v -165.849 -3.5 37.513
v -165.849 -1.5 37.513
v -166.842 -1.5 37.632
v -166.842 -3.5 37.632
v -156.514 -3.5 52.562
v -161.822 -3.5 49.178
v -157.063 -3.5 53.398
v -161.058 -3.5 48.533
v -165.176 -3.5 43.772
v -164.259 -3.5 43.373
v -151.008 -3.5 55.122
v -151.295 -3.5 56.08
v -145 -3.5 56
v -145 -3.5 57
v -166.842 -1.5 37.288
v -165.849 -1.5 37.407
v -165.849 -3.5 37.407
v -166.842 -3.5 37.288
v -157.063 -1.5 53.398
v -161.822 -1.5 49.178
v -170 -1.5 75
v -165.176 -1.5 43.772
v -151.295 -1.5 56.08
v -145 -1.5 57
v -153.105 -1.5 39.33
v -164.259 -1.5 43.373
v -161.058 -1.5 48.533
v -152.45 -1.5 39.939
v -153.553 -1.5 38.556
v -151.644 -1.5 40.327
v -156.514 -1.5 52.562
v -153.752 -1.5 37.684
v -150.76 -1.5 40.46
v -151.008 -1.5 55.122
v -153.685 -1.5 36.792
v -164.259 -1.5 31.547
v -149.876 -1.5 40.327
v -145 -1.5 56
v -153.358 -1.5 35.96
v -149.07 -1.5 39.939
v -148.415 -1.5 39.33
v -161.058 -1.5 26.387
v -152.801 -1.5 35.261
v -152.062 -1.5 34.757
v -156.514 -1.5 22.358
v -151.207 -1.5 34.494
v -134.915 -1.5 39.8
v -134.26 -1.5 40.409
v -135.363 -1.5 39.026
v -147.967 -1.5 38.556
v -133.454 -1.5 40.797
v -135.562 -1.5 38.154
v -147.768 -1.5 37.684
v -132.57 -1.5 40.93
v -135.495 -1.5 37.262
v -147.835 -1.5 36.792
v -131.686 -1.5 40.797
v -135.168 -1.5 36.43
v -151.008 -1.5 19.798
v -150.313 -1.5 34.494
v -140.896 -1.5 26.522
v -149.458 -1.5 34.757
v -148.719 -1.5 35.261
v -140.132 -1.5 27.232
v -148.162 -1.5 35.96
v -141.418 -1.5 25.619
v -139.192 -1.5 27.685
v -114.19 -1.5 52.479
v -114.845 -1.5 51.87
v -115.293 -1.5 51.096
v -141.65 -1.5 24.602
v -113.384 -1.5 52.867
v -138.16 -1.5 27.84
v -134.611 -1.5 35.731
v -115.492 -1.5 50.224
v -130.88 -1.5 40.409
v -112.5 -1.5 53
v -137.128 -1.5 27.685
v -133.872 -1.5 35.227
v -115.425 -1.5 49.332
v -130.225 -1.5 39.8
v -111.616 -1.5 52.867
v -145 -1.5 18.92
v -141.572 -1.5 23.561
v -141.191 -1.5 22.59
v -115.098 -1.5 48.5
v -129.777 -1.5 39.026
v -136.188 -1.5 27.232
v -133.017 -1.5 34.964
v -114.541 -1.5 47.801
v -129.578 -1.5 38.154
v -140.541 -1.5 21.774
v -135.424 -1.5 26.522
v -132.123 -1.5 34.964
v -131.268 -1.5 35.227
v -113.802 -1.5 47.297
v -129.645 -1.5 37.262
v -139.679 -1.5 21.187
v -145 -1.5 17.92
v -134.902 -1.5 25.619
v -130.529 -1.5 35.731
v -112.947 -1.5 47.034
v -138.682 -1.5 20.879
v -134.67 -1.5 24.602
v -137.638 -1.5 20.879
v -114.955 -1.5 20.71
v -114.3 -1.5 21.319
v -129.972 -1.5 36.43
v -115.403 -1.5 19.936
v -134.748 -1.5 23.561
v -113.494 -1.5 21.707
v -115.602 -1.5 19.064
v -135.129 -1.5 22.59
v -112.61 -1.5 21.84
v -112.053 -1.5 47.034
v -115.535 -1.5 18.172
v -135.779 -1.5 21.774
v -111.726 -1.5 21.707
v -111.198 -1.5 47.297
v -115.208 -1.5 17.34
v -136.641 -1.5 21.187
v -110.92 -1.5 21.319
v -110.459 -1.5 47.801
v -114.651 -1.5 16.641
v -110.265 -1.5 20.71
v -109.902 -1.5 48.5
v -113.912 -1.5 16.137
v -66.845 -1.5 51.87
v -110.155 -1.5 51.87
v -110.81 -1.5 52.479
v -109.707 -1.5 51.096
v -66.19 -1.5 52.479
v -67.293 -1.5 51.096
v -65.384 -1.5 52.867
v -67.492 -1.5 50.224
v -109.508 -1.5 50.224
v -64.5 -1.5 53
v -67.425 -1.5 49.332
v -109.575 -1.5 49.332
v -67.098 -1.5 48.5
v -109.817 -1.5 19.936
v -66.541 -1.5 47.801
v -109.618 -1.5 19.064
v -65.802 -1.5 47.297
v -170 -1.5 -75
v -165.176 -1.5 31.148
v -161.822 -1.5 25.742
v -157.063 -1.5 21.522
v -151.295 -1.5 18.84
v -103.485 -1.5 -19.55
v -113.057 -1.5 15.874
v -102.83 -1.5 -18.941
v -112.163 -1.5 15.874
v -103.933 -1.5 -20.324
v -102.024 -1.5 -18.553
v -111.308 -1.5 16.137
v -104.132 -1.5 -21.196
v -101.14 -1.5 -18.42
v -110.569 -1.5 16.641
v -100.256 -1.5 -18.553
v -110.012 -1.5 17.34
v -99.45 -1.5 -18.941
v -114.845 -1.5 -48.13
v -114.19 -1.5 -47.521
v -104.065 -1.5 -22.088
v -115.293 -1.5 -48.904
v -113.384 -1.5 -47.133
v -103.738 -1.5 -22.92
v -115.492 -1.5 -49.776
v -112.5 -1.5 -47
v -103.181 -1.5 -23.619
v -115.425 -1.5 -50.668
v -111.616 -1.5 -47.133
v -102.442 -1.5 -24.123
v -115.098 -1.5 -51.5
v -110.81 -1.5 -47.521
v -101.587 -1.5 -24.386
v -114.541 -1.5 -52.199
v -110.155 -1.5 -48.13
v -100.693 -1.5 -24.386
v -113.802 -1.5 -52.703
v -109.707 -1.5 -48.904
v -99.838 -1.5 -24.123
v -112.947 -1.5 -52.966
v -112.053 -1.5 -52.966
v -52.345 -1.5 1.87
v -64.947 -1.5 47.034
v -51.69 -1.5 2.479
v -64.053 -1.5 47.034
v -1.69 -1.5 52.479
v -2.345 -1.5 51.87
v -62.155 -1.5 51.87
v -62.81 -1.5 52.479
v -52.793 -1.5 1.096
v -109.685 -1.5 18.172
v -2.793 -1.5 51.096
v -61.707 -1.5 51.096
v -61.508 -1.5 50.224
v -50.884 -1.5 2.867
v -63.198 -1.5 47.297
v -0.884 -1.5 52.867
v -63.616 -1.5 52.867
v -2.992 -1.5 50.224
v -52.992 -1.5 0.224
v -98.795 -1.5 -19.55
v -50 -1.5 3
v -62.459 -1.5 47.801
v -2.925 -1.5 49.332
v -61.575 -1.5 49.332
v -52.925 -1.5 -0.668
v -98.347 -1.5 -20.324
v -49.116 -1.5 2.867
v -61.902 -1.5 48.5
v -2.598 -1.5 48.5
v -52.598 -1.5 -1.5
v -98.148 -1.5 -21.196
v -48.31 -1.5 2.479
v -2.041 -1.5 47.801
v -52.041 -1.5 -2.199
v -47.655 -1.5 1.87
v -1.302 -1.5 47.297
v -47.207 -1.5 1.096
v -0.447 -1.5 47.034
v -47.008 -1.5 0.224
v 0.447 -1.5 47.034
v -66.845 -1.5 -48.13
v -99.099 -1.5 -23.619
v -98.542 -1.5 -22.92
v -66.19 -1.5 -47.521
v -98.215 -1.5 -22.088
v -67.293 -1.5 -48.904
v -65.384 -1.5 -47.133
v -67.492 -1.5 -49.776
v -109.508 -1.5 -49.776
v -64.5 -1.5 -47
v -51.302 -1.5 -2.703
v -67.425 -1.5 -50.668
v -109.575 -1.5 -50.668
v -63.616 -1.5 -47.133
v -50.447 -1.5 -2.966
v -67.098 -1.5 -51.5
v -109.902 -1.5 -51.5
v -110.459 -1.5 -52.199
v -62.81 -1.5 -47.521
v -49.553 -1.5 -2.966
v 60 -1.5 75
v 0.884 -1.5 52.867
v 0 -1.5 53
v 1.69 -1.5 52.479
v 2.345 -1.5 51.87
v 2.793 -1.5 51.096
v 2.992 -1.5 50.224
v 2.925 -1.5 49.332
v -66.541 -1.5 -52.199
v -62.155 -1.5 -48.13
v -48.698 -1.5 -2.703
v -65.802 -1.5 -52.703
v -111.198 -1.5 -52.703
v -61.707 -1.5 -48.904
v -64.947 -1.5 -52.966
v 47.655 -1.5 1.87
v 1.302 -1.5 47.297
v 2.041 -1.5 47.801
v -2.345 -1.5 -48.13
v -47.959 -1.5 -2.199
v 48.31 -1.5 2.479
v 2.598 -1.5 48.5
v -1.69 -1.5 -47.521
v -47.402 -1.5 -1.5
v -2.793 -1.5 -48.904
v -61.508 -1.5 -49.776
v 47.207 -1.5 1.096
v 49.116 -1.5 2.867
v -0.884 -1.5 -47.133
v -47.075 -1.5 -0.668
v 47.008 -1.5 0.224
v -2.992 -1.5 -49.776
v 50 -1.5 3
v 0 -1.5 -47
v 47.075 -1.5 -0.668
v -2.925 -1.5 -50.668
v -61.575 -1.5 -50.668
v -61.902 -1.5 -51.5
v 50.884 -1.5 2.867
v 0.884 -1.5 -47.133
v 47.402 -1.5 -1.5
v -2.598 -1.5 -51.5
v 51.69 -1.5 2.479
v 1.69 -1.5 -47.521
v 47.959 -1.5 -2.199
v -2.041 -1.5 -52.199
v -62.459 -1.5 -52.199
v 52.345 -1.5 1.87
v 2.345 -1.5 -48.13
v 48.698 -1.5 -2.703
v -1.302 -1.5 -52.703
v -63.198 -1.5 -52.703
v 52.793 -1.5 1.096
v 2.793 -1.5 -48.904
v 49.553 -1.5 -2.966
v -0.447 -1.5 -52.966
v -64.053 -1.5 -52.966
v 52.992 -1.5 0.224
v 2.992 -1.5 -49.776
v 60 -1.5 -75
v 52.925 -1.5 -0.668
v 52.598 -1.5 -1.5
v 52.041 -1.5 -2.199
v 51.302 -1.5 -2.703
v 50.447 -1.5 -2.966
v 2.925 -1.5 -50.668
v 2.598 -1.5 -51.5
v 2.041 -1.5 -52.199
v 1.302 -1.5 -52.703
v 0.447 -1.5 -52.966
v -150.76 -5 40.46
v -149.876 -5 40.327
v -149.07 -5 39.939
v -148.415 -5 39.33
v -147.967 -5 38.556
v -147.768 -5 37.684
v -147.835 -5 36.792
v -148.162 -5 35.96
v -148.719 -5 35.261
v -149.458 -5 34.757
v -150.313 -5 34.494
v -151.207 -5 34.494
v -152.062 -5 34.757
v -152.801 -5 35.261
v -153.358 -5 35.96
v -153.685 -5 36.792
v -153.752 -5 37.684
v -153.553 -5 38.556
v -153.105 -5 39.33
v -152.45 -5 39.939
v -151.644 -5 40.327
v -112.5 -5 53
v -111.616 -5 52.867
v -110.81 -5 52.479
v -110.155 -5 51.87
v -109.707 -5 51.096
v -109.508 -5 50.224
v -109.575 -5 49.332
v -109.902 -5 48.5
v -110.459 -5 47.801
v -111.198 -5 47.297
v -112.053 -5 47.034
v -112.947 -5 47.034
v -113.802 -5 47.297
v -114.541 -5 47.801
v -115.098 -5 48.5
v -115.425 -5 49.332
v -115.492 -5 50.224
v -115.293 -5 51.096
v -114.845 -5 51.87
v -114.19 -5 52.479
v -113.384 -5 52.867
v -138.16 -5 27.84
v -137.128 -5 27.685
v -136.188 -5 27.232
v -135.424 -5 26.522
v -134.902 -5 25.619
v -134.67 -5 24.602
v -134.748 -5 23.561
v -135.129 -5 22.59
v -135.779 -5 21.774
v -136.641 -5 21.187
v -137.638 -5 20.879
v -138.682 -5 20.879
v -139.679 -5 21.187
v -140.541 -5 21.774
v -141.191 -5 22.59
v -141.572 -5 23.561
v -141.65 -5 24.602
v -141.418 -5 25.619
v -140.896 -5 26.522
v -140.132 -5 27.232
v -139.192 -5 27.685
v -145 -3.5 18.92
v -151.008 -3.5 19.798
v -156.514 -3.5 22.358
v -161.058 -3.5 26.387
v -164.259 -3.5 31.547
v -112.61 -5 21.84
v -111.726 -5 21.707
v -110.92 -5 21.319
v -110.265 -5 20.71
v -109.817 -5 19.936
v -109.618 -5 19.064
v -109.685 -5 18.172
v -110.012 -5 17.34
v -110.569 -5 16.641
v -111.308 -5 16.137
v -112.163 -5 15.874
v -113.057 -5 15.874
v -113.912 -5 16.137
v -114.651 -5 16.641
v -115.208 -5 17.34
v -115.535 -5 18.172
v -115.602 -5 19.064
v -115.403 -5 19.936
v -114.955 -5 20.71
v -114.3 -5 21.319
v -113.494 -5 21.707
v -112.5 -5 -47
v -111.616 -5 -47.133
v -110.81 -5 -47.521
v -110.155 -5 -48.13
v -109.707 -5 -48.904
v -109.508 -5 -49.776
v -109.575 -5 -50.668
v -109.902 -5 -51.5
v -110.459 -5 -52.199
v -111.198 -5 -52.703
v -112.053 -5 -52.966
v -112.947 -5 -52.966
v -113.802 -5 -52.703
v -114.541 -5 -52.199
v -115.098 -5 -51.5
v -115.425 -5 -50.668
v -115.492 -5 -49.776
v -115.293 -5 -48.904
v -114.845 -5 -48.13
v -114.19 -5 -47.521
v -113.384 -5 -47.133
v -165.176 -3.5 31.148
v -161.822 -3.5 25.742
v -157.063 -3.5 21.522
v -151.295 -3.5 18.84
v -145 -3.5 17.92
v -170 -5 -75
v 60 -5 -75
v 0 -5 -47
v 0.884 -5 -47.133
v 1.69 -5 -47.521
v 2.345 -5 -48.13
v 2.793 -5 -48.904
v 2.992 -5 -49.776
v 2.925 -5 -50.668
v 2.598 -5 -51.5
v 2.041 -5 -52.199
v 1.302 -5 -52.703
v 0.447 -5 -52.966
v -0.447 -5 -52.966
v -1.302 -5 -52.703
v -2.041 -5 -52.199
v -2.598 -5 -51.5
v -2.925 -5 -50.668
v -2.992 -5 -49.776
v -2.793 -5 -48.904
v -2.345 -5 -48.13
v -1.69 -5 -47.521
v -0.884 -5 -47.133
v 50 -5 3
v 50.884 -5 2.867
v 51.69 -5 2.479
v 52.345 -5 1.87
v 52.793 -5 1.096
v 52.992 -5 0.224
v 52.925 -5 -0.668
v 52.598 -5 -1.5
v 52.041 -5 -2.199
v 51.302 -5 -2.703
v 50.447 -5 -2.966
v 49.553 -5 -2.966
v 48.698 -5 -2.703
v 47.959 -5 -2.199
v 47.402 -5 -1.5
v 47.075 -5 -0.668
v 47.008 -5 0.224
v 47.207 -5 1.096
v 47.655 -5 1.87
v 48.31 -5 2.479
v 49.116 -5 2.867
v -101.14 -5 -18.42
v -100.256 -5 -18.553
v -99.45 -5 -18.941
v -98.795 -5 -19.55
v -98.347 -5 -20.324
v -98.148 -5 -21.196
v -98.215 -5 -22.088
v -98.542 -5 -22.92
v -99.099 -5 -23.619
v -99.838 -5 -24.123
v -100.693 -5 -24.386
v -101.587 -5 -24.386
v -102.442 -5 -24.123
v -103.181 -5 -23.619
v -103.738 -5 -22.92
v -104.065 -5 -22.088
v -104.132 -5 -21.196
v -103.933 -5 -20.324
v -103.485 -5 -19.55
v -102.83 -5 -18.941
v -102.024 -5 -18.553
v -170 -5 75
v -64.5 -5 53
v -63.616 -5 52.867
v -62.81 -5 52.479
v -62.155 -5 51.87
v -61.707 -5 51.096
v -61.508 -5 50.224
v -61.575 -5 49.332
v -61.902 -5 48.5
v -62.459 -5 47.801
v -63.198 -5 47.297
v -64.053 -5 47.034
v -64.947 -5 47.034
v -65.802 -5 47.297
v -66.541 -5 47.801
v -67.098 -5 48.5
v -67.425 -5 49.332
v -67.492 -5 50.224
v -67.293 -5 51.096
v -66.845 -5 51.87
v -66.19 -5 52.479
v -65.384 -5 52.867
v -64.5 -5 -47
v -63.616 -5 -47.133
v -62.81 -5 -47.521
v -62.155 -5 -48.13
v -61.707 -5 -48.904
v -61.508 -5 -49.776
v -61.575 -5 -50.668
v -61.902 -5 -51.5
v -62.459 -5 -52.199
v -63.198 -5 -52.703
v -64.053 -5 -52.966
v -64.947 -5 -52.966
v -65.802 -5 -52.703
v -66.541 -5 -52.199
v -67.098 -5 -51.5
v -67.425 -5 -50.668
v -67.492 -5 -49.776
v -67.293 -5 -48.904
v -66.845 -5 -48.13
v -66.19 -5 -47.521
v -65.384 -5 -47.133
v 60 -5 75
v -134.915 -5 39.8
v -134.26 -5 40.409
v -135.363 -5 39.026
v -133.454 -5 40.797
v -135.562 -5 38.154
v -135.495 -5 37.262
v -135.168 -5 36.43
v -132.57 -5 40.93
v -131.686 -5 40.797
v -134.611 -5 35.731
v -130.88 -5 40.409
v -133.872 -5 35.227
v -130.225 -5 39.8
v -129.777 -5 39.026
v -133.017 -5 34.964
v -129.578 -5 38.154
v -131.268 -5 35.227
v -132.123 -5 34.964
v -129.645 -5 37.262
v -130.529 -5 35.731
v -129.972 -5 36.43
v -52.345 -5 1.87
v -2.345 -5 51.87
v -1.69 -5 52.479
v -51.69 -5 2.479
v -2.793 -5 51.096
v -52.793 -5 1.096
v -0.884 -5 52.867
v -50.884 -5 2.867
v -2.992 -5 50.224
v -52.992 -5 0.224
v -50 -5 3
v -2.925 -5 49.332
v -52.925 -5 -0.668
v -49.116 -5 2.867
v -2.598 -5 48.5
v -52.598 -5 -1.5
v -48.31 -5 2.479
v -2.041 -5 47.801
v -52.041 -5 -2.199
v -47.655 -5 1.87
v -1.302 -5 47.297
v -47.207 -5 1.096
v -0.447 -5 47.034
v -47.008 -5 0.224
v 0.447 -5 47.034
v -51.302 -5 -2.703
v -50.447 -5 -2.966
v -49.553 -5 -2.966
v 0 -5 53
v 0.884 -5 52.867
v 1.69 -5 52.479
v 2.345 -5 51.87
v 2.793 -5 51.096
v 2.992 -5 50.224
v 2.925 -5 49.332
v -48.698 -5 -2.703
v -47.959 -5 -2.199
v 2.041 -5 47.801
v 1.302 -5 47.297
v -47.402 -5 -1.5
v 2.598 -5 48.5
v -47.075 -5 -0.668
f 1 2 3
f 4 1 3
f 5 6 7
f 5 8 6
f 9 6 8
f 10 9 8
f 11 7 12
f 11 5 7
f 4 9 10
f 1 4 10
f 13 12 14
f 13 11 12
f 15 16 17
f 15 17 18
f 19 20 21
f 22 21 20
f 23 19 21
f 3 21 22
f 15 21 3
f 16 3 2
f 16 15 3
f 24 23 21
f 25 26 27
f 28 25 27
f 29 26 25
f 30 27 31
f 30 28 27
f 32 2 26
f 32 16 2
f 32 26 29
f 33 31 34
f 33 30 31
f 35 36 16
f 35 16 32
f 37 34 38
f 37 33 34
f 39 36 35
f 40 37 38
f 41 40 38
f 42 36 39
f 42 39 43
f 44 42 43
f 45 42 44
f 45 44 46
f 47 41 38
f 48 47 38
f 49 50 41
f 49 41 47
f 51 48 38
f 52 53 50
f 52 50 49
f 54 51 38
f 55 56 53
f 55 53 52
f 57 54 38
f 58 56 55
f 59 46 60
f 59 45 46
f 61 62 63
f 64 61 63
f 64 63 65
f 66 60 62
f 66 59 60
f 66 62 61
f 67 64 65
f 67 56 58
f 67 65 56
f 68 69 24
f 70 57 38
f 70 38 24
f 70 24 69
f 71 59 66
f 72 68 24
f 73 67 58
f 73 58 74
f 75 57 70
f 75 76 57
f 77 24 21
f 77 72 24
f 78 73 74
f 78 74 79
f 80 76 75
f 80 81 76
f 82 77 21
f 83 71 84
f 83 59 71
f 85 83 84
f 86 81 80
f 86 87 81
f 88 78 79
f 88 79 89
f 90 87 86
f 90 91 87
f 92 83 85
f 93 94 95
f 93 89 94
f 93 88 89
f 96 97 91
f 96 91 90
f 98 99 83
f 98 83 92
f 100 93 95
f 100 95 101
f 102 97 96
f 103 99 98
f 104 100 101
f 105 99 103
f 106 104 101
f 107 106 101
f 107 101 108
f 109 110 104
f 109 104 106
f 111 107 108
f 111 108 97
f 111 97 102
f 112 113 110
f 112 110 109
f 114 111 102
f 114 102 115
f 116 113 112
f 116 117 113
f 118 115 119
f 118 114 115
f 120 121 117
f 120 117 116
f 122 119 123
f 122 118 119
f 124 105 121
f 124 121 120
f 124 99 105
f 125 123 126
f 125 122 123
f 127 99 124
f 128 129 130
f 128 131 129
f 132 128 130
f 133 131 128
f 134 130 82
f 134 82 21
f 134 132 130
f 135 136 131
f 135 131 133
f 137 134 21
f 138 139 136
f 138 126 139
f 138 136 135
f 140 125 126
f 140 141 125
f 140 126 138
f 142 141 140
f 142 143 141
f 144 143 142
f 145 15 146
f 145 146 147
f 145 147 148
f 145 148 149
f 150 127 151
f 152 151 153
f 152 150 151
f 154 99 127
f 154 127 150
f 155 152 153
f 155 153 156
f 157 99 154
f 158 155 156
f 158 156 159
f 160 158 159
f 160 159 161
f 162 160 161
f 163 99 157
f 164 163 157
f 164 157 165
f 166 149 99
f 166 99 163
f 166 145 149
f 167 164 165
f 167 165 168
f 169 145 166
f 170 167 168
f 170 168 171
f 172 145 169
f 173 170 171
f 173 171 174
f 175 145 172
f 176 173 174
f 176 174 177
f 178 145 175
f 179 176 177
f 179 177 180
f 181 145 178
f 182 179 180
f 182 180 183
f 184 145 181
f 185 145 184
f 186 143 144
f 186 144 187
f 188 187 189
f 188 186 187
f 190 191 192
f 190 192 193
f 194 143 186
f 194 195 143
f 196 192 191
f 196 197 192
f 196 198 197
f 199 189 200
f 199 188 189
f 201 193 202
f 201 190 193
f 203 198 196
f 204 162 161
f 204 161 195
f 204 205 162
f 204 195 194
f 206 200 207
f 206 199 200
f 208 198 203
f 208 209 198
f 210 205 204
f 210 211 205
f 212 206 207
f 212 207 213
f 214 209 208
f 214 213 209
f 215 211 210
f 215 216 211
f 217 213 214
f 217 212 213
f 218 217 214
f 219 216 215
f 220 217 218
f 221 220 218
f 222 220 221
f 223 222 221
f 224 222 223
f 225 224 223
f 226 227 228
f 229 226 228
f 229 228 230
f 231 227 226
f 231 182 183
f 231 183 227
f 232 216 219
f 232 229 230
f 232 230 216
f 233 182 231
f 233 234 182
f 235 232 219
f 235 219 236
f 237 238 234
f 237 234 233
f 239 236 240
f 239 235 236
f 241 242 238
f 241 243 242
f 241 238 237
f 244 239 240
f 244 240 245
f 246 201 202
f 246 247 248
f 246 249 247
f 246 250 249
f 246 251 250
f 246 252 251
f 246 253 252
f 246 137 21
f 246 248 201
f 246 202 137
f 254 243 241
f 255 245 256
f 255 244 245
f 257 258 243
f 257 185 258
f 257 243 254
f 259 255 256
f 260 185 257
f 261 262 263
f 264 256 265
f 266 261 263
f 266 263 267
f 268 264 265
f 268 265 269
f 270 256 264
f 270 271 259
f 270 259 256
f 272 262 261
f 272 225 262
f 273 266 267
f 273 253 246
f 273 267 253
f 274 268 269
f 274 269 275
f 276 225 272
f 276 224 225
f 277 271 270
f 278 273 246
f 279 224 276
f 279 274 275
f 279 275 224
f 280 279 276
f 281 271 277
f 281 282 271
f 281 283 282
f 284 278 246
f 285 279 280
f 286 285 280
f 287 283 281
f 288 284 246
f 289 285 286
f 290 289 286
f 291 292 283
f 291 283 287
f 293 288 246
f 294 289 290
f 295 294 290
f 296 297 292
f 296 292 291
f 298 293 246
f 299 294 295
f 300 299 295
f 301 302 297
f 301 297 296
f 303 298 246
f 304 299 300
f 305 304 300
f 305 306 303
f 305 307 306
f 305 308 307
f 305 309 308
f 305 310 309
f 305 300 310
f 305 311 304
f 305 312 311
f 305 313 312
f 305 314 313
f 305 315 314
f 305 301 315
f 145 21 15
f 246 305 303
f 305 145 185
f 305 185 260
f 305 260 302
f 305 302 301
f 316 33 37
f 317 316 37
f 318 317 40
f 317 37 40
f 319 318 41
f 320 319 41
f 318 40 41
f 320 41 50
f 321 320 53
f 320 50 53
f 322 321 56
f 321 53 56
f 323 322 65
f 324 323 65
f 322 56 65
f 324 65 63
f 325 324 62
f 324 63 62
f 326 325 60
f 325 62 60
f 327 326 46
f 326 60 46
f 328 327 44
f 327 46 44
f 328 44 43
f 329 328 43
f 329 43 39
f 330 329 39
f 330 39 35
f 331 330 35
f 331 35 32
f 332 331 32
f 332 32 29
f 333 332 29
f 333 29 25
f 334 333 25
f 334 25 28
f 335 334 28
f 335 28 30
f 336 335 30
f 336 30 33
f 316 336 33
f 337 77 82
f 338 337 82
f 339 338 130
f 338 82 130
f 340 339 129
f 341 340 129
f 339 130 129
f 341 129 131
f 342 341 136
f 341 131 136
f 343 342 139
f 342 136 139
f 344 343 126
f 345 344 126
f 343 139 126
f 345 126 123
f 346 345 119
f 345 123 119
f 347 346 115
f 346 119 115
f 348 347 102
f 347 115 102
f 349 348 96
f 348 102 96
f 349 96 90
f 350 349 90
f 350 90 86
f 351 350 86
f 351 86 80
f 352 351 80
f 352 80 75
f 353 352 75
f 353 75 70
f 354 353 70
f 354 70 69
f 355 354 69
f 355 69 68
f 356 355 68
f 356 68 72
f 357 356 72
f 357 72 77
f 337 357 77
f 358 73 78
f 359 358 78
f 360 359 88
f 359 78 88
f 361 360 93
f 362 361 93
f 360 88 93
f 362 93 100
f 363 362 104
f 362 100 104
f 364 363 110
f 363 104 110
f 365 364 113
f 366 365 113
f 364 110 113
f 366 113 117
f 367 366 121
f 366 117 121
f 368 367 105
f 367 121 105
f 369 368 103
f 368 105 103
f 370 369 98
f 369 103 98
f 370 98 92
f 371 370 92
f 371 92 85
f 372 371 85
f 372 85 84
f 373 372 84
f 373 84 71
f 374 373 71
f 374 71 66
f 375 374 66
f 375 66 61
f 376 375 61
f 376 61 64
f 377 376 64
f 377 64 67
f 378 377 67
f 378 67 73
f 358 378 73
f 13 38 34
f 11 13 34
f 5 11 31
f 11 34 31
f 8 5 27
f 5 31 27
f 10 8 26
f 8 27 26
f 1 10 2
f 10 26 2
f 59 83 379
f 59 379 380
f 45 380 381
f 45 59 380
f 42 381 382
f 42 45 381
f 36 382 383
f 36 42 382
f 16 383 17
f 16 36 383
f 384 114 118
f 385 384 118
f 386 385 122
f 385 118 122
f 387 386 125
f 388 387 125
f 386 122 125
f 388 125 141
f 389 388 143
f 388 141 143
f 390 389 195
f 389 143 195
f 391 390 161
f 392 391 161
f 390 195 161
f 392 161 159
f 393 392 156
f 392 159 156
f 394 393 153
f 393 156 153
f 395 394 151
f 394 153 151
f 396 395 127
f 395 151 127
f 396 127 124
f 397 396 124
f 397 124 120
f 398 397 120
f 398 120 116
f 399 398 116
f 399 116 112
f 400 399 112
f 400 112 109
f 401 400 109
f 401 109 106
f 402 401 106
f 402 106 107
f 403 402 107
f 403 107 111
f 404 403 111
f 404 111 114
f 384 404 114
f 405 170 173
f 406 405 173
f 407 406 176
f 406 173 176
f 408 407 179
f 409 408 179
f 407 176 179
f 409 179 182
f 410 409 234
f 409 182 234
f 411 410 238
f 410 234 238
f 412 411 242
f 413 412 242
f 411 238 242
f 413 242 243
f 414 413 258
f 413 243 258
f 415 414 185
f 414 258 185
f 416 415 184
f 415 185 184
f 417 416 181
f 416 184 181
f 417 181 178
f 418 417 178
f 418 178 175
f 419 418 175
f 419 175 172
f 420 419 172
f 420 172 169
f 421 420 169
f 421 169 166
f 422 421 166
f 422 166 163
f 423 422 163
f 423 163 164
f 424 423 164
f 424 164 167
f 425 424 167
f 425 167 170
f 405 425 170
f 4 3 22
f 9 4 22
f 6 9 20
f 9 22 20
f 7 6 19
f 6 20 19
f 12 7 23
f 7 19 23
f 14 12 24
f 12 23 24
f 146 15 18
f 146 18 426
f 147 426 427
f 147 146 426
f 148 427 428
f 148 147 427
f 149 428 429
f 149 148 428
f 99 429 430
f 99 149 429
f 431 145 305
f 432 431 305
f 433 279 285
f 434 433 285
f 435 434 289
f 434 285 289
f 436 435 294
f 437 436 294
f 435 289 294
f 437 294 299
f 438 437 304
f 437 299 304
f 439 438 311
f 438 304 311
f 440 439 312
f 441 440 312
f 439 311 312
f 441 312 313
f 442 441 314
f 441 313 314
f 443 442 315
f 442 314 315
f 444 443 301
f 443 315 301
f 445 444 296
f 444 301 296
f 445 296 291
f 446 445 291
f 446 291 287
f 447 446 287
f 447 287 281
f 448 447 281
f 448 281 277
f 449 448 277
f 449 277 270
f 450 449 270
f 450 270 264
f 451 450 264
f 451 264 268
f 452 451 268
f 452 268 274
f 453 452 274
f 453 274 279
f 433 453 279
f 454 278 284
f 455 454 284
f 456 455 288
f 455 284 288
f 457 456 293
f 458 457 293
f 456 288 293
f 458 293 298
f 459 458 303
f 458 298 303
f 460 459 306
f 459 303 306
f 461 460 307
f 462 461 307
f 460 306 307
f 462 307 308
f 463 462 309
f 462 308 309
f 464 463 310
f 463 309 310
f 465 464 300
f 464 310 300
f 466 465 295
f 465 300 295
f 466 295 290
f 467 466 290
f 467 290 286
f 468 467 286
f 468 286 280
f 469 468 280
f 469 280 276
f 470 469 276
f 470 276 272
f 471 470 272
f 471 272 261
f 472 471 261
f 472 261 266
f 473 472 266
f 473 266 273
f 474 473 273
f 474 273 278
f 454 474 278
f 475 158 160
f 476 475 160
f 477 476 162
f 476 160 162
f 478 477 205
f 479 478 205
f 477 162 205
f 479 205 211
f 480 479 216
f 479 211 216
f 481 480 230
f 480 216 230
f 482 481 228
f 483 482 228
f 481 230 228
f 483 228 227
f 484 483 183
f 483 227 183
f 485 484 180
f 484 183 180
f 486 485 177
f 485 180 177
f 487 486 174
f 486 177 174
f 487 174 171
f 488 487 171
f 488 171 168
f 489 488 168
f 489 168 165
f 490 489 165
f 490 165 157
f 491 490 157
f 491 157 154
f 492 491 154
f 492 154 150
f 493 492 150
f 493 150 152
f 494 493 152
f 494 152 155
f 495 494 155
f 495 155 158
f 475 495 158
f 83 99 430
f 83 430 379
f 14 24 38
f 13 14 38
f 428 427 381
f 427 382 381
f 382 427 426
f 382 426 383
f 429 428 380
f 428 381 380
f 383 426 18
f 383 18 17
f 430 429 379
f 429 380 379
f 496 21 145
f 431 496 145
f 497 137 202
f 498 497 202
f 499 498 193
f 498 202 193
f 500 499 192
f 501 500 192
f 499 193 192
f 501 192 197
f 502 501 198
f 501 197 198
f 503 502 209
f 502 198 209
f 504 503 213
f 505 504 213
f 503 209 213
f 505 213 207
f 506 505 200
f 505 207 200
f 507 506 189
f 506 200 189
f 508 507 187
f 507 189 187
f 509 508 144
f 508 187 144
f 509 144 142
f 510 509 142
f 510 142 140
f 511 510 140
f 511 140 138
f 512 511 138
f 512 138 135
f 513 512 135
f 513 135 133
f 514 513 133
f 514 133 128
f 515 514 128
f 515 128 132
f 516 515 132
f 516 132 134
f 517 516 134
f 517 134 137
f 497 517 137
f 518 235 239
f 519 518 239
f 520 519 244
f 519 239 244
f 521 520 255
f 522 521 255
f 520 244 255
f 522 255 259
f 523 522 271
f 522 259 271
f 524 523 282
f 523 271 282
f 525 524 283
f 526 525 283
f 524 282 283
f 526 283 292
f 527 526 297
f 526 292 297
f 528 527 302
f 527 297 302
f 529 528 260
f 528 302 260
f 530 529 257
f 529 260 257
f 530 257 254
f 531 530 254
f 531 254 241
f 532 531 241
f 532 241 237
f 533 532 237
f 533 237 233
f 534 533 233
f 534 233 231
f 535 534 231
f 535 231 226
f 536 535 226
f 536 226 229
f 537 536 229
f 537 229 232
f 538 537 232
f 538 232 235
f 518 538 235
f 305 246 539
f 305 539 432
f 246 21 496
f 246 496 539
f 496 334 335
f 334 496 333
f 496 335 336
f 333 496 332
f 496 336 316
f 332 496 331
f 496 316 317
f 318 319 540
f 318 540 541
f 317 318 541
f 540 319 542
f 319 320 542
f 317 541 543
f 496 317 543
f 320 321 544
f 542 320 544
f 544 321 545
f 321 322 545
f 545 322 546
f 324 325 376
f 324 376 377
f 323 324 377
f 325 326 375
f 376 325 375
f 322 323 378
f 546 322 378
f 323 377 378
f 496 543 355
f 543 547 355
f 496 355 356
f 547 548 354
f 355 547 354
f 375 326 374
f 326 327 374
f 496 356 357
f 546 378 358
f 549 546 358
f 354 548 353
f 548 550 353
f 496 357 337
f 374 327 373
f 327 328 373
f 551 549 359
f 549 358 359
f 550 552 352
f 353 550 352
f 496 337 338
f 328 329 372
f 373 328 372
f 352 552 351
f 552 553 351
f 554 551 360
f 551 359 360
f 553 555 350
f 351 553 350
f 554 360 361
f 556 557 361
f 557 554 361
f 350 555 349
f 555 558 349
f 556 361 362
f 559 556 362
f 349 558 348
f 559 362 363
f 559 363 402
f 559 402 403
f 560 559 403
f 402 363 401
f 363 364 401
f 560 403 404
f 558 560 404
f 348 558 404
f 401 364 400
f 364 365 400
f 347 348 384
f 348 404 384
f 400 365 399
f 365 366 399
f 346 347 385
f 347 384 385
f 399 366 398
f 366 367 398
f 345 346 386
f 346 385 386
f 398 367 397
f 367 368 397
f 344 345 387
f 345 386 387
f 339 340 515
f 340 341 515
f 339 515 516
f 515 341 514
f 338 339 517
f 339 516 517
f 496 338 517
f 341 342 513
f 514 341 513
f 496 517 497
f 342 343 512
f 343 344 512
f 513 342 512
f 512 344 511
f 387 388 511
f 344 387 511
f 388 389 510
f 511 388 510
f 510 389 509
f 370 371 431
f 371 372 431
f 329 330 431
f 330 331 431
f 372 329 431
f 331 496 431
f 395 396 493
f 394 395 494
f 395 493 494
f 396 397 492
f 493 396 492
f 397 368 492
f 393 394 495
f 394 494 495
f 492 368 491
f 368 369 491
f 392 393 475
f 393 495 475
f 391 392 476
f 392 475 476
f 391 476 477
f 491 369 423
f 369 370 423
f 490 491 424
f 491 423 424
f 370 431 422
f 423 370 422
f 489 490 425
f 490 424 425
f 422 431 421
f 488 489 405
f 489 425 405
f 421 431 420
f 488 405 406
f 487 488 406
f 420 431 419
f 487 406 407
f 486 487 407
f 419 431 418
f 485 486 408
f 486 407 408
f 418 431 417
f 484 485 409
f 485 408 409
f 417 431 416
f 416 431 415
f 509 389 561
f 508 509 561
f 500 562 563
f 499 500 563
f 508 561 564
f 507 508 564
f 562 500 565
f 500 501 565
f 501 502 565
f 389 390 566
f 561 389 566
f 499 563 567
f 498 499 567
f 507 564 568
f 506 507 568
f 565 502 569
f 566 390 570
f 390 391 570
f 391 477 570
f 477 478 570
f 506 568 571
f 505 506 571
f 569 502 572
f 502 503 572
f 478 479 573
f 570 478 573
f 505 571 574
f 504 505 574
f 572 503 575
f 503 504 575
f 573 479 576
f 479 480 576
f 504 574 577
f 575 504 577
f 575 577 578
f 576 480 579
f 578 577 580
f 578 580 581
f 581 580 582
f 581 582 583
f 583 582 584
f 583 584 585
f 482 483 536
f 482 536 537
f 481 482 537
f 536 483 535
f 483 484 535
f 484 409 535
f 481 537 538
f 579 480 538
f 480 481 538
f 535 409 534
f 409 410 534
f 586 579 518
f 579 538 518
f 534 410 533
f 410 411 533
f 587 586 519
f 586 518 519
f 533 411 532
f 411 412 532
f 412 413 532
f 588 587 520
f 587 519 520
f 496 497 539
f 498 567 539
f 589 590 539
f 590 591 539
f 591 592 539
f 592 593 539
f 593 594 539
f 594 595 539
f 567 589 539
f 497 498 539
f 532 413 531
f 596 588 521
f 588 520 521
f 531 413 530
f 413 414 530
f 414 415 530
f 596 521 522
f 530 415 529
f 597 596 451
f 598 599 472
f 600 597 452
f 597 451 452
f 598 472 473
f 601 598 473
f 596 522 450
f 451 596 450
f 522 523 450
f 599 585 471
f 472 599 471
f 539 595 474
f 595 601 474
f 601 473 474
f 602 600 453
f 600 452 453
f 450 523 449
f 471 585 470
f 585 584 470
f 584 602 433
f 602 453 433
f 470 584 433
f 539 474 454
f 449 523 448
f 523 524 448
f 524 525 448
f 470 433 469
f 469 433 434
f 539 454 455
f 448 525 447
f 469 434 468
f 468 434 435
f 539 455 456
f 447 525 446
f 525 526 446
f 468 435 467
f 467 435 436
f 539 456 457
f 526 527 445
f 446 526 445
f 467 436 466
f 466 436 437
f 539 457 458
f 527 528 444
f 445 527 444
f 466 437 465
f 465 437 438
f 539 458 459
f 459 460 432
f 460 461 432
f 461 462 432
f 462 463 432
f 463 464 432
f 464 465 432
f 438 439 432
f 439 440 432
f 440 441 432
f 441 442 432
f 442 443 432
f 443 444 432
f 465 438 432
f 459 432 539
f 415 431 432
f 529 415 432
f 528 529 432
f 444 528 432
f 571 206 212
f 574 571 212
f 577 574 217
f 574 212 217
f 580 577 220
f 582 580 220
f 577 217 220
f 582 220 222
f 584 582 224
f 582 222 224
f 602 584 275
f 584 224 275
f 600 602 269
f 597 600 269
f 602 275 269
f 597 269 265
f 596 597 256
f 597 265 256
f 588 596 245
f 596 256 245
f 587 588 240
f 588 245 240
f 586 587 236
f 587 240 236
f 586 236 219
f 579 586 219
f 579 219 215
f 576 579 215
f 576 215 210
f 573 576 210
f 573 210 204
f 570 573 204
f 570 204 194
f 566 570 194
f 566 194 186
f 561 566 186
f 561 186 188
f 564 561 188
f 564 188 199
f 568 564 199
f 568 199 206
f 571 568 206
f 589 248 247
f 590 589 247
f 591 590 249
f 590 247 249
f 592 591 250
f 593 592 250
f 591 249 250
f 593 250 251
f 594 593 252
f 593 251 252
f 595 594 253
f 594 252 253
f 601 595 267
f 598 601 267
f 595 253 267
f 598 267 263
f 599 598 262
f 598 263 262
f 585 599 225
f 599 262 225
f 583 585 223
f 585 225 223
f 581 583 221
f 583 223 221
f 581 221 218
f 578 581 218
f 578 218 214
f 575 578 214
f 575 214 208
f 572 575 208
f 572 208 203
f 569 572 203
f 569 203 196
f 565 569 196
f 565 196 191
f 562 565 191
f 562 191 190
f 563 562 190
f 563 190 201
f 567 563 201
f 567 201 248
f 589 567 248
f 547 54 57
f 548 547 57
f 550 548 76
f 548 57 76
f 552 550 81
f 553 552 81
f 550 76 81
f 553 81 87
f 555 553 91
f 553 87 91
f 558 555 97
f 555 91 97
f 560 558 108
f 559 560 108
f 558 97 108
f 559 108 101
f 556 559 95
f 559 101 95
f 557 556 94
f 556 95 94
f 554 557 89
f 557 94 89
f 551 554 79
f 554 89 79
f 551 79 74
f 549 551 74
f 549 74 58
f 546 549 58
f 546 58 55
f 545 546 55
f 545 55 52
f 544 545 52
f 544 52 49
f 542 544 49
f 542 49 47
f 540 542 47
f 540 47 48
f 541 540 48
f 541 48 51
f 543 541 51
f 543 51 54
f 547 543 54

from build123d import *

# Parameters (mm, degrees)
SKETCH_1_W           = 250
SKETCH_1_H           = 150
EXTRUDE_1_DEPTH      = 5
SKETCH_1_4_R         = 3
CUT_EXTRUDE_1_DEPTH  = 5
SKETCH_1_5_R         = 3
CUT_EXTRUDE_2_DEPTH  = 5
SKETCH_1_6_R         = 3
CUT_EXTRUDE_3_DEPTH  = 5
SKETCH_1_7_R         = 3
CUT_EXTRUDE_4_DEPTH  = 5
SKETCH_2_R           = 3
CUT_EXTRUDE_5_DEPTH  = 5
SKETCH_3_R           = 3
CUT_EXTRUDE_6_DEPTH  = 45
SKETCH_3_3_R         = 3.5
CUT_EXTRUDE_7_DEPTH  = 45
SKETCH_4_R           = 3
CUT_EXTRUDE_8_DEPTH  = 5
SKETCH_4_3_R         = 3
CUT_EXTRUDE_9_DEPTH  = 5
SKETCH_5_R           = 3
CUT_EXTRUDE_10_DEPTH = 5
SKETCH_6_W           = 250
SKETCH_6_H           = 150
SKETCH_6_R           = 3
SKETCH_6_R_2         = 3.5
CUT_EXTRUDE_11_DEPTH = 1.5
SKETCH_7_R           = 3
CUT_EXTRUDE_12_DEPTH = 205.296965225
SKETCH_8_W           = 82.621849766
SKETCH_8_H           = 181.309059209
CUT_EXTRUDE_13_DEPTH = 10
CUT_EXTRUDE_14_DEPTH = 2


with BuildPart() as part:
    # 草圖1 → 填料-伸長1 (new body)
    with BuildSketch(Plane(origin=(0, 0, 0), x_dir=(1, 0, 0), z_dir=(0, 1, 0))):
        with Locations((-65, 0)):
            Rectangle(SKETCH_1_W, SKETCH_1_H)
    extrude(amount=-EXTRUDE_1_DEPTH)

    # 草圖1<4> → 除料-伸長1 (cut)
    with BuildSketch(Plane(origin=(0, 0, 0), x_dir=(1, 0, 0), z_dir=(0, 1, 0))):
        with Locations((0, 50)):
            Circle(SKETCH_1_4_R)
    extrude(amount=-CUT_EXTRUDE_1_DEPTH, mode=Mode.SUBTRACT)

    # 草圖1<5> → 除料-伸長2 (cut)
    with BuildSketch(Plane(origin=(0, 0, 0), x_dir=(1, 0, 0), z_dir=(0, 1, 0))):
        with Locations((-50, 0)):
            Circle(SKETCH_1_5_R)
    extrude(amount=-CUT_EXTRUDE_2_DEPTH, mode=Mode.SUBTRACT)

    # 草圖1<6> → 除料-伸長3 (cut)
    with BuildSketch(Plane(origin=(0, 0, 0), x_dir=(1, 0, 0), z_dir=(0, 1, 0))):
        with Locations((0, -50)):
            Circle(SKETCH_1_6_R)
    extrude(amount=-CUT_EXTRUDE_3_DEPTH, mode=Mode.SUBTRACT)

    # 草圖1<7> → 除料-伸長4 (cut)
    with BuildSketch(Plane(origin=(0, 0, 0), x_dir=(1, 0, 0), z_dir=(0, 1, 0))):
        with Locations((50, 0)):
            Circle(SKETCH_1_7_R)
    extrude(amount=-CUT_EXTRUDE_4_DEPTH, mode=Mode.SUBTRACT)

    # 草圖2 → 除料-伸長5 (cut)
    with BuildSketch(Plane(origin=(0, 0, 0), x_dir=(1, 0, 0), z_dir=(0, 1, 0))):
        with Locations((-150.76, -37.46)):
            Circle(SKETCH_2_R)
    extrude(amount=-CUT_EXTRUDE_5_DEPTH, mode=Mode.SUBTRACT)

    # 草圖3 → 除料-伸長6 (cut)
    with BuildSketch(Plane(origin=(0, 0, 0), x_dir=(1, 0, 0), z_dir=(0, 1, 0))):
        with Locations((-132.57, -37.93)):
            Circle(SKETCH_3_R)
    extrude(amount=-CUT_EXTRUDE_6_DEPTH, mode=Mode.SUBTRACT)

    # 草圖3<3> → 除料-伸長7 (cut)
    with BuildSketch(Plane(origin=(0, 0, 0), x_dir=(1, 0, 0), z_dir=(0, 1, 0))):
        with Locations((-138.16, -24.34)):
            Circle(SKETCH_3_3_R)
    extrude(amount=-CUT_EXTRUDE_7_DEPTH, mode=Mode.SUBTRACT)

    # 草圖4 → 除料-伸長8 (cut)
    with BuildSketch(Plane(origin=(0, 0, 0), x_dir=(1, 0, 0), z_dir=(0, 1, 0))):
        with Locations((-112.5, -50)):
            Circle(SKETCH_4_R)
    extrude(amount=-CUT_EXTRUDE_8_DEPTH, mode=Mode.SUBTRACT)

    # 草圖4<3> → 除料-伸長9 (cut)
    with BuildSketch(Plane(origin=(0, 0, 0), x_dir=(1, 0, 0), z_dir=(0, 1, 0))):
        with Locations((-64.5, -50)):
            Circle(SKETCH_4_3_R)
    extrude(amount=-CUT_EXTRUDE_9_DEPTH, mode=Mode.SUBTRACT)

    # 草圖5 → 除料-伸長10 (cut)
    with BuildSketch(Plane(origin=(0, 0, 0), x_dir=(1, 0, 0), z_dir=(0, 1, 0))):
        with Locations((-112.61, -18.84)):
            Circle(SKETCH_5_R)
        with Locations((-101.14, 21.42)):
            Circle(SKETCH_5_R)
    extrude(amount=-CUT_EXTRUDE_10_DEPTH, mode=Mode.SUBTRACT)

    # 草圖6 → 除料-伸長11 (cut)
    with BuildSketch(Plane(origin=(0, 0, 0), x_dir=(1, 0, 0), z_dir=(0, 1, 0))):
        with Locations((-65, 0)):
            Rectangle(SKETCH_6_W, SKETCH_6_H)
        with Locations((-150.76, -37.46)):
            Circle(SKETCH_6_R, mode=Mode.SUBTRACT)
        with Locations((-138.16, -24.34)):
            Circle(SKETCH_6_R_2, mode=Mode.SUBTRACT)
        with Locations((-132.57, -37.93)):
            Circle(SKETCH_6_R, mode=Mode.SUBTRACT)
        with Locations((-112.61, -18.84)):
            Circle(SKETCH_6_R, mode=Mode.SUBTRACT)
        with Locations((-112.5, -50)):
            Circle(SKETCH_6_R, mode=Mode.SUBTRACT)
        with Locations((-101.14, 21.42)):
            Circle(SKETCH_6_R, mode=Mode.SUBTRACT)
        with Locations((-50, 0)):
            Circle(SKETCH_6_R, mode=Mode.SUBTRACT)
        with Locations((-64.5, -50)):
            Circle(SKETCH_6_R, mode=Mode.SUBTRACT)
        with Locations((0, 50)):
            Circle(SKETCH_6_R, mode=Mode.SUBTRACT)
        with Locations((0, -50)):
            Circle(SKETCH_6_R, mode=Mode.SUBTRACT)
        with Locations((50, 0)):
            Circle(SKETCH_6_R, mode=Mode.SUBTRACT)
    extrude(amount=-CUT_EXTRUDE_11_DEPTH, mode=Mode.SUBTRACT)

    # 草圖7 → 除料-伸長12 (cut, through all)
    with BuildSketch(Plane(origin=(0, -1.5, 0), x_dir=(1, 0, 0), z_dir=(0, 1, 0))):
        with Locations((-64.5, 50)):
            Circle(SKETCH_7_R)
        with Locations((-112.5, 50)):
            Circle(SKETCH_7_R)
        with Locations((-64.5, -50)):
            Circle(SKETCH_7_R)
        with Locations((-112.5, -50)):
            Circle(SKETCH_7_R)
    extrude(amount=-CUT_EXTRUDE_12_DEPTH, mode=Mode.SUBTRACT)

    # 草圖8 → 除料-伸長13 (cut)
    with BuildSketch(Plane(origin=(0, -1.5, 0), x_dir=(1, 0, 0), z_dir=(0, 1, 0))):
        with Locations((-211.310924883, 0.092792435)):
            Rectangle(SKETCH_8_W, SKETCH_8_H)
    extrude(amount=-CUT_EXTRUDE_13_DEPTH, mode=Mode.SUBTRACT)

    # 草圖11 → 除料-伸長14 (cut)
    with BuildSketch(Plane(origin=(0, -1.5, 0), x_dir=(1, 0, 0), z_dir=(0, 1, 0))):
        with BuildLine():
            Line((-165.849119967, -37.512806521), (-166.841935203, -37.632463975))
            ThreePointArc((-166.841935203, -37.632463975), (-159.595989048, -51.4607747), (-145, -57))
            Line((-145, -57), (-145, -56))
            ThreePointArc((-145, -56), (-158.932535, -50.712557668), (-165.849119967, -37.512806521))
        make_face()
    cut_extrude_14 = extrude(amount=-CUT_EXTRUDE_14_DEPTH, mode=Mode.SUBTRACT)

    # 鏡射1: 除料-伸長14 across plane
    add(cut_extrude_14.mirror(Plane.XY.offset(37.46)), mode=Mode.SUBTRACT)


solid = part.part
